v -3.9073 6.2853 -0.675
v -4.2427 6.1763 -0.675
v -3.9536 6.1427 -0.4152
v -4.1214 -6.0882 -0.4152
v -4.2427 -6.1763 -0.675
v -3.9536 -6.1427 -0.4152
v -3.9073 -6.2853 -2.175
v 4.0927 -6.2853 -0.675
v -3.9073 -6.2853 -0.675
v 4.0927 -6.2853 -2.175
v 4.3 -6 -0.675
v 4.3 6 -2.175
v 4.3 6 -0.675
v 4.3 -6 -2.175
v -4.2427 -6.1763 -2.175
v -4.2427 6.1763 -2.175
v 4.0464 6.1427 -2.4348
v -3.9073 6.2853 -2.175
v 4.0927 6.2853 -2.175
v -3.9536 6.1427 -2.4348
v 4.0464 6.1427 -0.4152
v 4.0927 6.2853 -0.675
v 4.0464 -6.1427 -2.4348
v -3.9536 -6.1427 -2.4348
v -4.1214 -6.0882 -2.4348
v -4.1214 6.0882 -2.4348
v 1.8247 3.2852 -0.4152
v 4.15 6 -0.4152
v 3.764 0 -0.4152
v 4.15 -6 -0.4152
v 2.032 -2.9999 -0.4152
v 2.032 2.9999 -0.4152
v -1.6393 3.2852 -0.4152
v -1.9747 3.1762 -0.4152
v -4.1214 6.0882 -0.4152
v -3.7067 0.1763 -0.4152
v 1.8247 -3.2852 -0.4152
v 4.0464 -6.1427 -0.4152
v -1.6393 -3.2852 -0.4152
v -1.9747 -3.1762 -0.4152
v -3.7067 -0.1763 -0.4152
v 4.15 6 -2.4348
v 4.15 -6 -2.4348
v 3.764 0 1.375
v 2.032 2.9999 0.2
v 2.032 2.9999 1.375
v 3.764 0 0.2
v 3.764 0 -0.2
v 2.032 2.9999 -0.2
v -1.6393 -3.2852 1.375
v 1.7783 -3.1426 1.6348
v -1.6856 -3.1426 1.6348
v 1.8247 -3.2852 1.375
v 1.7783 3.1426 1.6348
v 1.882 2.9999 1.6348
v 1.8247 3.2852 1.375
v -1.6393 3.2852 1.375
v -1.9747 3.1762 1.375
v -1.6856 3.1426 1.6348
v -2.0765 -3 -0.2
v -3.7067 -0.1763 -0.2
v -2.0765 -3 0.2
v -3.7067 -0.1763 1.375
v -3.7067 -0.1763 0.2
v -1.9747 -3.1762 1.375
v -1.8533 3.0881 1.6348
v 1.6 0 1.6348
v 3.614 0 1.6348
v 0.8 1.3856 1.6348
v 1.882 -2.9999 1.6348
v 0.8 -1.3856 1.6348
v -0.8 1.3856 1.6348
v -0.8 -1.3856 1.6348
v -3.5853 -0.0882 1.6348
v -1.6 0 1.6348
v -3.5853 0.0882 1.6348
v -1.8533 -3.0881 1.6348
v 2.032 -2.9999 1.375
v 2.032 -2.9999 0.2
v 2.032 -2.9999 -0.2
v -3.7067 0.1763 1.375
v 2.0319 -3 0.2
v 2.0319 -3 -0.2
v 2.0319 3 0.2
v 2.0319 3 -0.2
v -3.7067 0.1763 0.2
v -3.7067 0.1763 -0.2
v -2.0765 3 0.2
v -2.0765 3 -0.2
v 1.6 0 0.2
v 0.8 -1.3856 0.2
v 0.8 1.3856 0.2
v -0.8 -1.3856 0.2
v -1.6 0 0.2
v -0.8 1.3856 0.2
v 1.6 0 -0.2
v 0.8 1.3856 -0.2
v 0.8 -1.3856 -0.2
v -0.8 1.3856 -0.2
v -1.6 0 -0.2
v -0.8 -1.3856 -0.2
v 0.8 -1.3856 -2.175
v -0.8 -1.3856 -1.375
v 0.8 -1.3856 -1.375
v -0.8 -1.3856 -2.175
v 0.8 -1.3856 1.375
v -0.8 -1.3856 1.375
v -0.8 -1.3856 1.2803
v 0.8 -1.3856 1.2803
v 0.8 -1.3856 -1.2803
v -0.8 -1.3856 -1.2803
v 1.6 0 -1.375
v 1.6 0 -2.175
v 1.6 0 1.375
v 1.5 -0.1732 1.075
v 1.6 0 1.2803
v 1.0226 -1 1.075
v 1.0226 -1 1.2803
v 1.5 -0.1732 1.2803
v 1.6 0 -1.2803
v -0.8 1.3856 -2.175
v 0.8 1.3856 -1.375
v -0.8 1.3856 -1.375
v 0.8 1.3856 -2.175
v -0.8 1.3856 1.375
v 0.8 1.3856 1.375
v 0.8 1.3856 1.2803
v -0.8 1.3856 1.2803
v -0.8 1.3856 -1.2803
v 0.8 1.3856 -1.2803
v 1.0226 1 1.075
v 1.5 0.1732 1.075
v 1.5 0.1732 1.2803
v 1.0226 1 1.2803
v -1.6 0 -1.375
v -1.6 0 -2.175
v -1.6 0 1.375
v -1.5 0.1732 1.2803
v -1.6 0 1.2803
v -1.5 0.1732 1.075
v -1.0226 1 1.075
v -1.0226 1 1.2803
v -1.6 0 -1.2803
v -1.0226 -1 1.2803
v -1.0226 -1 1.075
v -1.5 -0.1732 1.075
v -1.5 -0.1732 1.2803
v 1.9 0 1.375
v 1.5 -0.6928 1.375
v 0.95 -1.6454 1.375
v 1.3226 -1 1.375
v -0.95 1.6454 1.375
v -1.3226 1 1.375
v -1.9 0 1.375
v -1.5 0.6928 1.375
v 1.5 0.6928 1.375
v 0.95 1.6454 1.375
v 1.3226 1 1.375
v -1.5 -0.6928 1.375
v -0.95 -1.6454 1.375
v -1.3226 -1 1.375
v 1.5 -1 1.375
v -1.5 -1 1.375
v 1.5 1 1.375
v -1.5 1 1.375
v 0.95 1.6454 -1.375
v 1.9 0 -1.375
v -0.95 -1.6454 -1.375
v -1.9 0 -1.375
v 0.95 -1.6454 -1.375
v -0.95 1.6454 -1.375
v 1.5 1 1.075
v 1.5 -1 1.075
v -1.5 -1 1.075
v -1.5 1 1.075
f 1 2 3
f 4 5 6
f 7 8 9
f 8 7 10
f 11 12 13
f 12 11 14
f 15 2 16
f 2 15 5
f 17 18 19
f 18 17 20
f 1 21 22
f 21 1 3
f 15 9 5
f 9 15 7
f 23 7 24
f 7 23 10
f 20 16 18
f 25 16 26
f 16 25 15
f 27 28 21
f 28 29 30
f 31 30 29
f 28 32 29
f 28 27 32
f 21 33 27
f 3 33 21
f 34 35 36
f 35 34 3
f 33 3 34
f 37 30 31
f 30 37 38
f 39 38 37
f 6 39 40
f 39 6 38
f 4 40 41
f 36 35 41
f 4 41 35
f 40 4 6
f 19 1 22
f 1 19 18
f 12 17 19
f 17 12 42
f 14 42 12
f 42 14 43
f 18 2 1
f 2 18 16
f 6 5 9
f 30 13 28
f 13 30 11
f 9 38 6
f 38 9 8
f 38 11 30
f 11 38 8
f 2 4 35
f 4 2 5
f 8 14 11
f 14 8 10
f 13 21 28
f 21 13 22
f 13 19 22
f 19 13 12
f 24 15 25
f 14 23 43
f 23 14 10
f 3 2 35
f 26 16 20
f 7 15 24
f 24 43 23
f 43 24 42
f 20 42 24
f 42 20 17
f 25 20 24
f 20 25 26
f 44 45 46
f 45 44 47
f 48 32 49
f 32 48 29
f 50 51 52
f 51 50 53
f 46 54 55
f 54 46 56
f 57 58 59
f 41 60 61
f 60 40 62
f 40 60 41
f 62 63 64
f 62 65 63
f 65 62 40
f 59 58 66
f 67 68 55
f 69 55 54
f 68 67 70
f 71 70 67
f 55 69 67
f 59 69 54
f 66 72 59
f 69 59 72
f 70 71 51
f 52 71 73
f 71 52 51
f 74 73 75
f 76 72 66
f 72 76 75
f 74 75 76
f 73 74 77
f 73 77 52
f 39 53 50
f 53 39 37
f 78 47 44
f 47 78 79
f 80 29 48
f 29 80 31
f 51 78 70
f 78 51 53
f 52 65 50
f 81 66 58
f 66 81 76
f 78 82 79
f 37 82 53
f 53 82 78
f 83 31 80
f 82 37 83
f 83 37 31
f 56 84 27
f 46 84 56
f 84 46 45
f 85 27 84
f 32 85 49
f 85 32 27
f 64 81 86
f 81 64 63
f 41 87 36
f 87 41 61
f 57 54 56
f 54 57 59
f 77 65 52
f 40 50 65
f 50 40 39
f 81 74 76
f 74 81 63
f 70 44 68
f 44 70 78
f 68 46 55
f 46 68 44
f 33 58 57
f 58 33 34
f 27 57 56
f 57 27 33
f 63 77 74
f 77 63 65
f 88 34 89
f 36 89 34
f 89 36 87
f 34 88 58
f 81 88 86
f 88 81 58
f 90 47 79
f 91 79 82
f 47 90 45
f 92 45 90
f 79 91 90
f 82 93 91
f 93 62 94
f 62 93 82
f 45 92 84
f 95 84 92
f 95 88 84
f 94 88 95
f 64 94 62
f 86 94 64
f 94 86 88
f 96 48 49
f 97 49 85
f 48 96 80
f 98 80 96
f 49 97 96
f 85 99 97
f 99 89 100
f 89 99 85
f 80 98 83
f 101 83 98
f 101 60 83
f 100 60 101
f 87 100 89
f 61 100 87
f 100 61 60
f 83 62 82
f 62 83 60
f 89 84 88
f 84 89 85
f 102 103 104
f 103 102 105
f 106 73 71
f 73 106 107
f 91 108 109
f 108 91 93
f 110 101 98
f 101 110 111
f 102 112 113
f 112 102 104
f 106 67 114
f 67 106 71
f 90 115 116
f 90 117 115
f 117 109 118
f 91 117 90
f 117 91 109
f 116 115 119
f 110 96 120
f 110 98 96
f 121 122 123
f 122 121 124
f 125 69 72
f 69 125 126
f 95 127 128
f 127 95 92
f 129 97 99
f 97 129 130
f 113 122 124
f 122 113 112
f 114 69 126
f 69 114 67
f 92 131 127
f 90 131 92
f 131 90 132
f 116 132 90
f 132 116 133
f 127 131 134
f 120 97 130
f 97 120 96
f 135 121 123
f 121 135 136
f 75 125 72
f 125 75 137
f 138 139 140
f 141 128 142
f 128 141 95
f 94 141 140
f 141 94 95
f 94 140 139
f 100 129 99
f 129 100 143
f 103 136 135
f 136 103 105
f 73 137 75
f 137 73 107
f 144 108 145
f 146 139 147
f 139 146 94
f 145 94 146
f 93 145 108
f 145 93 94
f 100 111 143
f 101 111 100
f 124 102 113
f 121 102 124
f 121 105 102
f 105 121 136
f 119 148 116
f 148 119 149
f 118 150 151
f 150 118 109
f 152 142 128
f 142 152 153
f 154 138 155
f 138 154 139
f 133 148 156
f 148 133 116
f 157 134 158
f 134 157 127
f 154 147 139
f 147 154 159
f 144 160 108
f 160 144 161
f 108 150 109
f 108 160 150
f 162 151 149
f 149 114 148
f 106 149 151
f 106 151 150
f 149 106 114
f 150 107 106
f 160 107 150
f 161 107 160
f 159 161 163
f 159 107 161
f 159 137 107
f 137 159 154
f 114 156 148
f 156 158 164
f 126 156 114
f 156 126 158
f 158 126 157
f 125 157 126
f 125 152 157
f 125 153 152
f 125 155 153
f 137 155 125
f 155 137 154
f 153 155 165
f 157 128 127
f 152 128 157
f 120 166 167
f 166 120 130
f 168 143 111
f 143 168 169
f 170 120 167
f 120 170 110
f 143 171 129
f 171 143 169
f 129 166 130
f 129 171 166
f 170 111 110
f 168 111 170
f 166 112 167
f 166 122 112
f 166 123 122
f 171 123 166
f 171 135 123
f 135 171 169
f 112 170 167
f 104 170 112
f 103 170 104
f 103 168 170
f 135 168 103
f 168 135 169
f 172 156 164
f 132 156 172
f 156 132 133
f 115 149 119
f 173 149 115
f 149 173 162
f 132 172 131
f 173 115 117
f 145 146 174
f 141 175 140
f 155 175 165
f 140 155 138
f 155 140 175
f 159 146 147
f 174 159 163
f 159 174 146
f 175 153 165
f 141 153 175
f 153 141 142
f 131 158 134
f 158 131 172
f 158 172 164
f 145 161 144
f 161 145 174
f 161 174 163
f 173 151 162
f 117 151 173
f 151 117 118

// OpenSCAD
// Parameters
across_flats = 6.0; //[3.0:12.0:0.1]
thickness = 2.75; //[1.4:5.5:0.05]
screw_diameter = 3.0; //[2.0:6.0:0.1]
hole_diameter = 3.2; //[2.6:4.5:0.05]
t_slot_width = 8.0; //[4.0:16.0:0.1]
t_slot_neck_width = 5.0; //[2.5:10.0:0.1]
t_slot_depth = 1.5; //[0.8:3.0:0.05]
chamfer = 0.3; //[0.1:1.0:0.05]
overlap = 0.8; //[0.5:2.0:0.1]
hex_radius = 3.464; //[1.732:6.928:0.001]
t_slot_length = 12.0; //[6.0:24.0:0.5]
serration_pitch = 1.2; //[0.6:2.4:0.1]
serration_depth = 0.4; //[0.2:1.0:0.05]

// Hexagonal nut body
module nut_body() {
  linear_extrude(height = thickness, center = true) {
    polygon(points = [
      [hex_radius, 0],
      [hex_radius / 2, hex_radius * 0.8660254],
      [-hex_radius / 2, hex_radius * 0.8660254],
      [-hex_radius, 0],
      [-hex_radius / 2, -hex_radius * 0.8660254],
      [hex_radius / 2, -hex_radius * 0.8660254]
    ]);
  }
}

// T-slot profile
module t_slot_profile() {
  translate([0, 0, -thickness / 2 + t_slot_depth / 2 - overlap])
    cube([t_slot_width, t_slot_length, t_slot_depth], center = true);
}

// Center hole
module center_hole() {
  cylinder(r = hole_diameter / 2, h = thickness + 2 * overlap, center = true);
}

// Lead-in chamfers
module lead_in_chamfers() {
  translate([0, 0, thickness / 2 - chamfer])
    rotate([180, 0, 0])
    cylinder(r1 = hole_diameter / 2 + chamfer, r2 = 0, h = 2 * chamfer, center = true);
}

module lead_in_chamfers_bottom() {
  translate([0, 0, -thickness / 2 + chamfer])
    cylinder(r1 = hole_diameter / 2 + chamfer, r2 = 0, h = 2 * chamfer, center = true);
}

// Fillets (edge relief)
module fillets() {
  sphere(r = chamfer, center = true);
}

// Knurling or serrations
module knurling_or_serrations() {
  cube([t_slot_width + 2 * overlap, serration_pitch, serration_depth], center = true);
}

// Engraved size marking
module engraved_size_marking() {
  translate([0, 0, thickness / 2 - chamfer / 2])
    cube([across_flats / 2, across_flats / 3, chamfer], center = true);
}

// Assemble the T-slot nut
module t_slot_nut() {
  difference() {
    minkowski() {
      union() {
        nut_body();
        t_slot_profile();
      }
      fillets();
    }
    center_hole();
    lead_in_chamfers();
    lead_in_chamfers_bottom();
    union() {
      for (i = [-2:2]) {
        translate([0, i * serration_pitch, 0])
          knurling_or_serrations();
      }
    }
    engraved_size_marking();
  }
}

// Final output
t_slot_nut();
